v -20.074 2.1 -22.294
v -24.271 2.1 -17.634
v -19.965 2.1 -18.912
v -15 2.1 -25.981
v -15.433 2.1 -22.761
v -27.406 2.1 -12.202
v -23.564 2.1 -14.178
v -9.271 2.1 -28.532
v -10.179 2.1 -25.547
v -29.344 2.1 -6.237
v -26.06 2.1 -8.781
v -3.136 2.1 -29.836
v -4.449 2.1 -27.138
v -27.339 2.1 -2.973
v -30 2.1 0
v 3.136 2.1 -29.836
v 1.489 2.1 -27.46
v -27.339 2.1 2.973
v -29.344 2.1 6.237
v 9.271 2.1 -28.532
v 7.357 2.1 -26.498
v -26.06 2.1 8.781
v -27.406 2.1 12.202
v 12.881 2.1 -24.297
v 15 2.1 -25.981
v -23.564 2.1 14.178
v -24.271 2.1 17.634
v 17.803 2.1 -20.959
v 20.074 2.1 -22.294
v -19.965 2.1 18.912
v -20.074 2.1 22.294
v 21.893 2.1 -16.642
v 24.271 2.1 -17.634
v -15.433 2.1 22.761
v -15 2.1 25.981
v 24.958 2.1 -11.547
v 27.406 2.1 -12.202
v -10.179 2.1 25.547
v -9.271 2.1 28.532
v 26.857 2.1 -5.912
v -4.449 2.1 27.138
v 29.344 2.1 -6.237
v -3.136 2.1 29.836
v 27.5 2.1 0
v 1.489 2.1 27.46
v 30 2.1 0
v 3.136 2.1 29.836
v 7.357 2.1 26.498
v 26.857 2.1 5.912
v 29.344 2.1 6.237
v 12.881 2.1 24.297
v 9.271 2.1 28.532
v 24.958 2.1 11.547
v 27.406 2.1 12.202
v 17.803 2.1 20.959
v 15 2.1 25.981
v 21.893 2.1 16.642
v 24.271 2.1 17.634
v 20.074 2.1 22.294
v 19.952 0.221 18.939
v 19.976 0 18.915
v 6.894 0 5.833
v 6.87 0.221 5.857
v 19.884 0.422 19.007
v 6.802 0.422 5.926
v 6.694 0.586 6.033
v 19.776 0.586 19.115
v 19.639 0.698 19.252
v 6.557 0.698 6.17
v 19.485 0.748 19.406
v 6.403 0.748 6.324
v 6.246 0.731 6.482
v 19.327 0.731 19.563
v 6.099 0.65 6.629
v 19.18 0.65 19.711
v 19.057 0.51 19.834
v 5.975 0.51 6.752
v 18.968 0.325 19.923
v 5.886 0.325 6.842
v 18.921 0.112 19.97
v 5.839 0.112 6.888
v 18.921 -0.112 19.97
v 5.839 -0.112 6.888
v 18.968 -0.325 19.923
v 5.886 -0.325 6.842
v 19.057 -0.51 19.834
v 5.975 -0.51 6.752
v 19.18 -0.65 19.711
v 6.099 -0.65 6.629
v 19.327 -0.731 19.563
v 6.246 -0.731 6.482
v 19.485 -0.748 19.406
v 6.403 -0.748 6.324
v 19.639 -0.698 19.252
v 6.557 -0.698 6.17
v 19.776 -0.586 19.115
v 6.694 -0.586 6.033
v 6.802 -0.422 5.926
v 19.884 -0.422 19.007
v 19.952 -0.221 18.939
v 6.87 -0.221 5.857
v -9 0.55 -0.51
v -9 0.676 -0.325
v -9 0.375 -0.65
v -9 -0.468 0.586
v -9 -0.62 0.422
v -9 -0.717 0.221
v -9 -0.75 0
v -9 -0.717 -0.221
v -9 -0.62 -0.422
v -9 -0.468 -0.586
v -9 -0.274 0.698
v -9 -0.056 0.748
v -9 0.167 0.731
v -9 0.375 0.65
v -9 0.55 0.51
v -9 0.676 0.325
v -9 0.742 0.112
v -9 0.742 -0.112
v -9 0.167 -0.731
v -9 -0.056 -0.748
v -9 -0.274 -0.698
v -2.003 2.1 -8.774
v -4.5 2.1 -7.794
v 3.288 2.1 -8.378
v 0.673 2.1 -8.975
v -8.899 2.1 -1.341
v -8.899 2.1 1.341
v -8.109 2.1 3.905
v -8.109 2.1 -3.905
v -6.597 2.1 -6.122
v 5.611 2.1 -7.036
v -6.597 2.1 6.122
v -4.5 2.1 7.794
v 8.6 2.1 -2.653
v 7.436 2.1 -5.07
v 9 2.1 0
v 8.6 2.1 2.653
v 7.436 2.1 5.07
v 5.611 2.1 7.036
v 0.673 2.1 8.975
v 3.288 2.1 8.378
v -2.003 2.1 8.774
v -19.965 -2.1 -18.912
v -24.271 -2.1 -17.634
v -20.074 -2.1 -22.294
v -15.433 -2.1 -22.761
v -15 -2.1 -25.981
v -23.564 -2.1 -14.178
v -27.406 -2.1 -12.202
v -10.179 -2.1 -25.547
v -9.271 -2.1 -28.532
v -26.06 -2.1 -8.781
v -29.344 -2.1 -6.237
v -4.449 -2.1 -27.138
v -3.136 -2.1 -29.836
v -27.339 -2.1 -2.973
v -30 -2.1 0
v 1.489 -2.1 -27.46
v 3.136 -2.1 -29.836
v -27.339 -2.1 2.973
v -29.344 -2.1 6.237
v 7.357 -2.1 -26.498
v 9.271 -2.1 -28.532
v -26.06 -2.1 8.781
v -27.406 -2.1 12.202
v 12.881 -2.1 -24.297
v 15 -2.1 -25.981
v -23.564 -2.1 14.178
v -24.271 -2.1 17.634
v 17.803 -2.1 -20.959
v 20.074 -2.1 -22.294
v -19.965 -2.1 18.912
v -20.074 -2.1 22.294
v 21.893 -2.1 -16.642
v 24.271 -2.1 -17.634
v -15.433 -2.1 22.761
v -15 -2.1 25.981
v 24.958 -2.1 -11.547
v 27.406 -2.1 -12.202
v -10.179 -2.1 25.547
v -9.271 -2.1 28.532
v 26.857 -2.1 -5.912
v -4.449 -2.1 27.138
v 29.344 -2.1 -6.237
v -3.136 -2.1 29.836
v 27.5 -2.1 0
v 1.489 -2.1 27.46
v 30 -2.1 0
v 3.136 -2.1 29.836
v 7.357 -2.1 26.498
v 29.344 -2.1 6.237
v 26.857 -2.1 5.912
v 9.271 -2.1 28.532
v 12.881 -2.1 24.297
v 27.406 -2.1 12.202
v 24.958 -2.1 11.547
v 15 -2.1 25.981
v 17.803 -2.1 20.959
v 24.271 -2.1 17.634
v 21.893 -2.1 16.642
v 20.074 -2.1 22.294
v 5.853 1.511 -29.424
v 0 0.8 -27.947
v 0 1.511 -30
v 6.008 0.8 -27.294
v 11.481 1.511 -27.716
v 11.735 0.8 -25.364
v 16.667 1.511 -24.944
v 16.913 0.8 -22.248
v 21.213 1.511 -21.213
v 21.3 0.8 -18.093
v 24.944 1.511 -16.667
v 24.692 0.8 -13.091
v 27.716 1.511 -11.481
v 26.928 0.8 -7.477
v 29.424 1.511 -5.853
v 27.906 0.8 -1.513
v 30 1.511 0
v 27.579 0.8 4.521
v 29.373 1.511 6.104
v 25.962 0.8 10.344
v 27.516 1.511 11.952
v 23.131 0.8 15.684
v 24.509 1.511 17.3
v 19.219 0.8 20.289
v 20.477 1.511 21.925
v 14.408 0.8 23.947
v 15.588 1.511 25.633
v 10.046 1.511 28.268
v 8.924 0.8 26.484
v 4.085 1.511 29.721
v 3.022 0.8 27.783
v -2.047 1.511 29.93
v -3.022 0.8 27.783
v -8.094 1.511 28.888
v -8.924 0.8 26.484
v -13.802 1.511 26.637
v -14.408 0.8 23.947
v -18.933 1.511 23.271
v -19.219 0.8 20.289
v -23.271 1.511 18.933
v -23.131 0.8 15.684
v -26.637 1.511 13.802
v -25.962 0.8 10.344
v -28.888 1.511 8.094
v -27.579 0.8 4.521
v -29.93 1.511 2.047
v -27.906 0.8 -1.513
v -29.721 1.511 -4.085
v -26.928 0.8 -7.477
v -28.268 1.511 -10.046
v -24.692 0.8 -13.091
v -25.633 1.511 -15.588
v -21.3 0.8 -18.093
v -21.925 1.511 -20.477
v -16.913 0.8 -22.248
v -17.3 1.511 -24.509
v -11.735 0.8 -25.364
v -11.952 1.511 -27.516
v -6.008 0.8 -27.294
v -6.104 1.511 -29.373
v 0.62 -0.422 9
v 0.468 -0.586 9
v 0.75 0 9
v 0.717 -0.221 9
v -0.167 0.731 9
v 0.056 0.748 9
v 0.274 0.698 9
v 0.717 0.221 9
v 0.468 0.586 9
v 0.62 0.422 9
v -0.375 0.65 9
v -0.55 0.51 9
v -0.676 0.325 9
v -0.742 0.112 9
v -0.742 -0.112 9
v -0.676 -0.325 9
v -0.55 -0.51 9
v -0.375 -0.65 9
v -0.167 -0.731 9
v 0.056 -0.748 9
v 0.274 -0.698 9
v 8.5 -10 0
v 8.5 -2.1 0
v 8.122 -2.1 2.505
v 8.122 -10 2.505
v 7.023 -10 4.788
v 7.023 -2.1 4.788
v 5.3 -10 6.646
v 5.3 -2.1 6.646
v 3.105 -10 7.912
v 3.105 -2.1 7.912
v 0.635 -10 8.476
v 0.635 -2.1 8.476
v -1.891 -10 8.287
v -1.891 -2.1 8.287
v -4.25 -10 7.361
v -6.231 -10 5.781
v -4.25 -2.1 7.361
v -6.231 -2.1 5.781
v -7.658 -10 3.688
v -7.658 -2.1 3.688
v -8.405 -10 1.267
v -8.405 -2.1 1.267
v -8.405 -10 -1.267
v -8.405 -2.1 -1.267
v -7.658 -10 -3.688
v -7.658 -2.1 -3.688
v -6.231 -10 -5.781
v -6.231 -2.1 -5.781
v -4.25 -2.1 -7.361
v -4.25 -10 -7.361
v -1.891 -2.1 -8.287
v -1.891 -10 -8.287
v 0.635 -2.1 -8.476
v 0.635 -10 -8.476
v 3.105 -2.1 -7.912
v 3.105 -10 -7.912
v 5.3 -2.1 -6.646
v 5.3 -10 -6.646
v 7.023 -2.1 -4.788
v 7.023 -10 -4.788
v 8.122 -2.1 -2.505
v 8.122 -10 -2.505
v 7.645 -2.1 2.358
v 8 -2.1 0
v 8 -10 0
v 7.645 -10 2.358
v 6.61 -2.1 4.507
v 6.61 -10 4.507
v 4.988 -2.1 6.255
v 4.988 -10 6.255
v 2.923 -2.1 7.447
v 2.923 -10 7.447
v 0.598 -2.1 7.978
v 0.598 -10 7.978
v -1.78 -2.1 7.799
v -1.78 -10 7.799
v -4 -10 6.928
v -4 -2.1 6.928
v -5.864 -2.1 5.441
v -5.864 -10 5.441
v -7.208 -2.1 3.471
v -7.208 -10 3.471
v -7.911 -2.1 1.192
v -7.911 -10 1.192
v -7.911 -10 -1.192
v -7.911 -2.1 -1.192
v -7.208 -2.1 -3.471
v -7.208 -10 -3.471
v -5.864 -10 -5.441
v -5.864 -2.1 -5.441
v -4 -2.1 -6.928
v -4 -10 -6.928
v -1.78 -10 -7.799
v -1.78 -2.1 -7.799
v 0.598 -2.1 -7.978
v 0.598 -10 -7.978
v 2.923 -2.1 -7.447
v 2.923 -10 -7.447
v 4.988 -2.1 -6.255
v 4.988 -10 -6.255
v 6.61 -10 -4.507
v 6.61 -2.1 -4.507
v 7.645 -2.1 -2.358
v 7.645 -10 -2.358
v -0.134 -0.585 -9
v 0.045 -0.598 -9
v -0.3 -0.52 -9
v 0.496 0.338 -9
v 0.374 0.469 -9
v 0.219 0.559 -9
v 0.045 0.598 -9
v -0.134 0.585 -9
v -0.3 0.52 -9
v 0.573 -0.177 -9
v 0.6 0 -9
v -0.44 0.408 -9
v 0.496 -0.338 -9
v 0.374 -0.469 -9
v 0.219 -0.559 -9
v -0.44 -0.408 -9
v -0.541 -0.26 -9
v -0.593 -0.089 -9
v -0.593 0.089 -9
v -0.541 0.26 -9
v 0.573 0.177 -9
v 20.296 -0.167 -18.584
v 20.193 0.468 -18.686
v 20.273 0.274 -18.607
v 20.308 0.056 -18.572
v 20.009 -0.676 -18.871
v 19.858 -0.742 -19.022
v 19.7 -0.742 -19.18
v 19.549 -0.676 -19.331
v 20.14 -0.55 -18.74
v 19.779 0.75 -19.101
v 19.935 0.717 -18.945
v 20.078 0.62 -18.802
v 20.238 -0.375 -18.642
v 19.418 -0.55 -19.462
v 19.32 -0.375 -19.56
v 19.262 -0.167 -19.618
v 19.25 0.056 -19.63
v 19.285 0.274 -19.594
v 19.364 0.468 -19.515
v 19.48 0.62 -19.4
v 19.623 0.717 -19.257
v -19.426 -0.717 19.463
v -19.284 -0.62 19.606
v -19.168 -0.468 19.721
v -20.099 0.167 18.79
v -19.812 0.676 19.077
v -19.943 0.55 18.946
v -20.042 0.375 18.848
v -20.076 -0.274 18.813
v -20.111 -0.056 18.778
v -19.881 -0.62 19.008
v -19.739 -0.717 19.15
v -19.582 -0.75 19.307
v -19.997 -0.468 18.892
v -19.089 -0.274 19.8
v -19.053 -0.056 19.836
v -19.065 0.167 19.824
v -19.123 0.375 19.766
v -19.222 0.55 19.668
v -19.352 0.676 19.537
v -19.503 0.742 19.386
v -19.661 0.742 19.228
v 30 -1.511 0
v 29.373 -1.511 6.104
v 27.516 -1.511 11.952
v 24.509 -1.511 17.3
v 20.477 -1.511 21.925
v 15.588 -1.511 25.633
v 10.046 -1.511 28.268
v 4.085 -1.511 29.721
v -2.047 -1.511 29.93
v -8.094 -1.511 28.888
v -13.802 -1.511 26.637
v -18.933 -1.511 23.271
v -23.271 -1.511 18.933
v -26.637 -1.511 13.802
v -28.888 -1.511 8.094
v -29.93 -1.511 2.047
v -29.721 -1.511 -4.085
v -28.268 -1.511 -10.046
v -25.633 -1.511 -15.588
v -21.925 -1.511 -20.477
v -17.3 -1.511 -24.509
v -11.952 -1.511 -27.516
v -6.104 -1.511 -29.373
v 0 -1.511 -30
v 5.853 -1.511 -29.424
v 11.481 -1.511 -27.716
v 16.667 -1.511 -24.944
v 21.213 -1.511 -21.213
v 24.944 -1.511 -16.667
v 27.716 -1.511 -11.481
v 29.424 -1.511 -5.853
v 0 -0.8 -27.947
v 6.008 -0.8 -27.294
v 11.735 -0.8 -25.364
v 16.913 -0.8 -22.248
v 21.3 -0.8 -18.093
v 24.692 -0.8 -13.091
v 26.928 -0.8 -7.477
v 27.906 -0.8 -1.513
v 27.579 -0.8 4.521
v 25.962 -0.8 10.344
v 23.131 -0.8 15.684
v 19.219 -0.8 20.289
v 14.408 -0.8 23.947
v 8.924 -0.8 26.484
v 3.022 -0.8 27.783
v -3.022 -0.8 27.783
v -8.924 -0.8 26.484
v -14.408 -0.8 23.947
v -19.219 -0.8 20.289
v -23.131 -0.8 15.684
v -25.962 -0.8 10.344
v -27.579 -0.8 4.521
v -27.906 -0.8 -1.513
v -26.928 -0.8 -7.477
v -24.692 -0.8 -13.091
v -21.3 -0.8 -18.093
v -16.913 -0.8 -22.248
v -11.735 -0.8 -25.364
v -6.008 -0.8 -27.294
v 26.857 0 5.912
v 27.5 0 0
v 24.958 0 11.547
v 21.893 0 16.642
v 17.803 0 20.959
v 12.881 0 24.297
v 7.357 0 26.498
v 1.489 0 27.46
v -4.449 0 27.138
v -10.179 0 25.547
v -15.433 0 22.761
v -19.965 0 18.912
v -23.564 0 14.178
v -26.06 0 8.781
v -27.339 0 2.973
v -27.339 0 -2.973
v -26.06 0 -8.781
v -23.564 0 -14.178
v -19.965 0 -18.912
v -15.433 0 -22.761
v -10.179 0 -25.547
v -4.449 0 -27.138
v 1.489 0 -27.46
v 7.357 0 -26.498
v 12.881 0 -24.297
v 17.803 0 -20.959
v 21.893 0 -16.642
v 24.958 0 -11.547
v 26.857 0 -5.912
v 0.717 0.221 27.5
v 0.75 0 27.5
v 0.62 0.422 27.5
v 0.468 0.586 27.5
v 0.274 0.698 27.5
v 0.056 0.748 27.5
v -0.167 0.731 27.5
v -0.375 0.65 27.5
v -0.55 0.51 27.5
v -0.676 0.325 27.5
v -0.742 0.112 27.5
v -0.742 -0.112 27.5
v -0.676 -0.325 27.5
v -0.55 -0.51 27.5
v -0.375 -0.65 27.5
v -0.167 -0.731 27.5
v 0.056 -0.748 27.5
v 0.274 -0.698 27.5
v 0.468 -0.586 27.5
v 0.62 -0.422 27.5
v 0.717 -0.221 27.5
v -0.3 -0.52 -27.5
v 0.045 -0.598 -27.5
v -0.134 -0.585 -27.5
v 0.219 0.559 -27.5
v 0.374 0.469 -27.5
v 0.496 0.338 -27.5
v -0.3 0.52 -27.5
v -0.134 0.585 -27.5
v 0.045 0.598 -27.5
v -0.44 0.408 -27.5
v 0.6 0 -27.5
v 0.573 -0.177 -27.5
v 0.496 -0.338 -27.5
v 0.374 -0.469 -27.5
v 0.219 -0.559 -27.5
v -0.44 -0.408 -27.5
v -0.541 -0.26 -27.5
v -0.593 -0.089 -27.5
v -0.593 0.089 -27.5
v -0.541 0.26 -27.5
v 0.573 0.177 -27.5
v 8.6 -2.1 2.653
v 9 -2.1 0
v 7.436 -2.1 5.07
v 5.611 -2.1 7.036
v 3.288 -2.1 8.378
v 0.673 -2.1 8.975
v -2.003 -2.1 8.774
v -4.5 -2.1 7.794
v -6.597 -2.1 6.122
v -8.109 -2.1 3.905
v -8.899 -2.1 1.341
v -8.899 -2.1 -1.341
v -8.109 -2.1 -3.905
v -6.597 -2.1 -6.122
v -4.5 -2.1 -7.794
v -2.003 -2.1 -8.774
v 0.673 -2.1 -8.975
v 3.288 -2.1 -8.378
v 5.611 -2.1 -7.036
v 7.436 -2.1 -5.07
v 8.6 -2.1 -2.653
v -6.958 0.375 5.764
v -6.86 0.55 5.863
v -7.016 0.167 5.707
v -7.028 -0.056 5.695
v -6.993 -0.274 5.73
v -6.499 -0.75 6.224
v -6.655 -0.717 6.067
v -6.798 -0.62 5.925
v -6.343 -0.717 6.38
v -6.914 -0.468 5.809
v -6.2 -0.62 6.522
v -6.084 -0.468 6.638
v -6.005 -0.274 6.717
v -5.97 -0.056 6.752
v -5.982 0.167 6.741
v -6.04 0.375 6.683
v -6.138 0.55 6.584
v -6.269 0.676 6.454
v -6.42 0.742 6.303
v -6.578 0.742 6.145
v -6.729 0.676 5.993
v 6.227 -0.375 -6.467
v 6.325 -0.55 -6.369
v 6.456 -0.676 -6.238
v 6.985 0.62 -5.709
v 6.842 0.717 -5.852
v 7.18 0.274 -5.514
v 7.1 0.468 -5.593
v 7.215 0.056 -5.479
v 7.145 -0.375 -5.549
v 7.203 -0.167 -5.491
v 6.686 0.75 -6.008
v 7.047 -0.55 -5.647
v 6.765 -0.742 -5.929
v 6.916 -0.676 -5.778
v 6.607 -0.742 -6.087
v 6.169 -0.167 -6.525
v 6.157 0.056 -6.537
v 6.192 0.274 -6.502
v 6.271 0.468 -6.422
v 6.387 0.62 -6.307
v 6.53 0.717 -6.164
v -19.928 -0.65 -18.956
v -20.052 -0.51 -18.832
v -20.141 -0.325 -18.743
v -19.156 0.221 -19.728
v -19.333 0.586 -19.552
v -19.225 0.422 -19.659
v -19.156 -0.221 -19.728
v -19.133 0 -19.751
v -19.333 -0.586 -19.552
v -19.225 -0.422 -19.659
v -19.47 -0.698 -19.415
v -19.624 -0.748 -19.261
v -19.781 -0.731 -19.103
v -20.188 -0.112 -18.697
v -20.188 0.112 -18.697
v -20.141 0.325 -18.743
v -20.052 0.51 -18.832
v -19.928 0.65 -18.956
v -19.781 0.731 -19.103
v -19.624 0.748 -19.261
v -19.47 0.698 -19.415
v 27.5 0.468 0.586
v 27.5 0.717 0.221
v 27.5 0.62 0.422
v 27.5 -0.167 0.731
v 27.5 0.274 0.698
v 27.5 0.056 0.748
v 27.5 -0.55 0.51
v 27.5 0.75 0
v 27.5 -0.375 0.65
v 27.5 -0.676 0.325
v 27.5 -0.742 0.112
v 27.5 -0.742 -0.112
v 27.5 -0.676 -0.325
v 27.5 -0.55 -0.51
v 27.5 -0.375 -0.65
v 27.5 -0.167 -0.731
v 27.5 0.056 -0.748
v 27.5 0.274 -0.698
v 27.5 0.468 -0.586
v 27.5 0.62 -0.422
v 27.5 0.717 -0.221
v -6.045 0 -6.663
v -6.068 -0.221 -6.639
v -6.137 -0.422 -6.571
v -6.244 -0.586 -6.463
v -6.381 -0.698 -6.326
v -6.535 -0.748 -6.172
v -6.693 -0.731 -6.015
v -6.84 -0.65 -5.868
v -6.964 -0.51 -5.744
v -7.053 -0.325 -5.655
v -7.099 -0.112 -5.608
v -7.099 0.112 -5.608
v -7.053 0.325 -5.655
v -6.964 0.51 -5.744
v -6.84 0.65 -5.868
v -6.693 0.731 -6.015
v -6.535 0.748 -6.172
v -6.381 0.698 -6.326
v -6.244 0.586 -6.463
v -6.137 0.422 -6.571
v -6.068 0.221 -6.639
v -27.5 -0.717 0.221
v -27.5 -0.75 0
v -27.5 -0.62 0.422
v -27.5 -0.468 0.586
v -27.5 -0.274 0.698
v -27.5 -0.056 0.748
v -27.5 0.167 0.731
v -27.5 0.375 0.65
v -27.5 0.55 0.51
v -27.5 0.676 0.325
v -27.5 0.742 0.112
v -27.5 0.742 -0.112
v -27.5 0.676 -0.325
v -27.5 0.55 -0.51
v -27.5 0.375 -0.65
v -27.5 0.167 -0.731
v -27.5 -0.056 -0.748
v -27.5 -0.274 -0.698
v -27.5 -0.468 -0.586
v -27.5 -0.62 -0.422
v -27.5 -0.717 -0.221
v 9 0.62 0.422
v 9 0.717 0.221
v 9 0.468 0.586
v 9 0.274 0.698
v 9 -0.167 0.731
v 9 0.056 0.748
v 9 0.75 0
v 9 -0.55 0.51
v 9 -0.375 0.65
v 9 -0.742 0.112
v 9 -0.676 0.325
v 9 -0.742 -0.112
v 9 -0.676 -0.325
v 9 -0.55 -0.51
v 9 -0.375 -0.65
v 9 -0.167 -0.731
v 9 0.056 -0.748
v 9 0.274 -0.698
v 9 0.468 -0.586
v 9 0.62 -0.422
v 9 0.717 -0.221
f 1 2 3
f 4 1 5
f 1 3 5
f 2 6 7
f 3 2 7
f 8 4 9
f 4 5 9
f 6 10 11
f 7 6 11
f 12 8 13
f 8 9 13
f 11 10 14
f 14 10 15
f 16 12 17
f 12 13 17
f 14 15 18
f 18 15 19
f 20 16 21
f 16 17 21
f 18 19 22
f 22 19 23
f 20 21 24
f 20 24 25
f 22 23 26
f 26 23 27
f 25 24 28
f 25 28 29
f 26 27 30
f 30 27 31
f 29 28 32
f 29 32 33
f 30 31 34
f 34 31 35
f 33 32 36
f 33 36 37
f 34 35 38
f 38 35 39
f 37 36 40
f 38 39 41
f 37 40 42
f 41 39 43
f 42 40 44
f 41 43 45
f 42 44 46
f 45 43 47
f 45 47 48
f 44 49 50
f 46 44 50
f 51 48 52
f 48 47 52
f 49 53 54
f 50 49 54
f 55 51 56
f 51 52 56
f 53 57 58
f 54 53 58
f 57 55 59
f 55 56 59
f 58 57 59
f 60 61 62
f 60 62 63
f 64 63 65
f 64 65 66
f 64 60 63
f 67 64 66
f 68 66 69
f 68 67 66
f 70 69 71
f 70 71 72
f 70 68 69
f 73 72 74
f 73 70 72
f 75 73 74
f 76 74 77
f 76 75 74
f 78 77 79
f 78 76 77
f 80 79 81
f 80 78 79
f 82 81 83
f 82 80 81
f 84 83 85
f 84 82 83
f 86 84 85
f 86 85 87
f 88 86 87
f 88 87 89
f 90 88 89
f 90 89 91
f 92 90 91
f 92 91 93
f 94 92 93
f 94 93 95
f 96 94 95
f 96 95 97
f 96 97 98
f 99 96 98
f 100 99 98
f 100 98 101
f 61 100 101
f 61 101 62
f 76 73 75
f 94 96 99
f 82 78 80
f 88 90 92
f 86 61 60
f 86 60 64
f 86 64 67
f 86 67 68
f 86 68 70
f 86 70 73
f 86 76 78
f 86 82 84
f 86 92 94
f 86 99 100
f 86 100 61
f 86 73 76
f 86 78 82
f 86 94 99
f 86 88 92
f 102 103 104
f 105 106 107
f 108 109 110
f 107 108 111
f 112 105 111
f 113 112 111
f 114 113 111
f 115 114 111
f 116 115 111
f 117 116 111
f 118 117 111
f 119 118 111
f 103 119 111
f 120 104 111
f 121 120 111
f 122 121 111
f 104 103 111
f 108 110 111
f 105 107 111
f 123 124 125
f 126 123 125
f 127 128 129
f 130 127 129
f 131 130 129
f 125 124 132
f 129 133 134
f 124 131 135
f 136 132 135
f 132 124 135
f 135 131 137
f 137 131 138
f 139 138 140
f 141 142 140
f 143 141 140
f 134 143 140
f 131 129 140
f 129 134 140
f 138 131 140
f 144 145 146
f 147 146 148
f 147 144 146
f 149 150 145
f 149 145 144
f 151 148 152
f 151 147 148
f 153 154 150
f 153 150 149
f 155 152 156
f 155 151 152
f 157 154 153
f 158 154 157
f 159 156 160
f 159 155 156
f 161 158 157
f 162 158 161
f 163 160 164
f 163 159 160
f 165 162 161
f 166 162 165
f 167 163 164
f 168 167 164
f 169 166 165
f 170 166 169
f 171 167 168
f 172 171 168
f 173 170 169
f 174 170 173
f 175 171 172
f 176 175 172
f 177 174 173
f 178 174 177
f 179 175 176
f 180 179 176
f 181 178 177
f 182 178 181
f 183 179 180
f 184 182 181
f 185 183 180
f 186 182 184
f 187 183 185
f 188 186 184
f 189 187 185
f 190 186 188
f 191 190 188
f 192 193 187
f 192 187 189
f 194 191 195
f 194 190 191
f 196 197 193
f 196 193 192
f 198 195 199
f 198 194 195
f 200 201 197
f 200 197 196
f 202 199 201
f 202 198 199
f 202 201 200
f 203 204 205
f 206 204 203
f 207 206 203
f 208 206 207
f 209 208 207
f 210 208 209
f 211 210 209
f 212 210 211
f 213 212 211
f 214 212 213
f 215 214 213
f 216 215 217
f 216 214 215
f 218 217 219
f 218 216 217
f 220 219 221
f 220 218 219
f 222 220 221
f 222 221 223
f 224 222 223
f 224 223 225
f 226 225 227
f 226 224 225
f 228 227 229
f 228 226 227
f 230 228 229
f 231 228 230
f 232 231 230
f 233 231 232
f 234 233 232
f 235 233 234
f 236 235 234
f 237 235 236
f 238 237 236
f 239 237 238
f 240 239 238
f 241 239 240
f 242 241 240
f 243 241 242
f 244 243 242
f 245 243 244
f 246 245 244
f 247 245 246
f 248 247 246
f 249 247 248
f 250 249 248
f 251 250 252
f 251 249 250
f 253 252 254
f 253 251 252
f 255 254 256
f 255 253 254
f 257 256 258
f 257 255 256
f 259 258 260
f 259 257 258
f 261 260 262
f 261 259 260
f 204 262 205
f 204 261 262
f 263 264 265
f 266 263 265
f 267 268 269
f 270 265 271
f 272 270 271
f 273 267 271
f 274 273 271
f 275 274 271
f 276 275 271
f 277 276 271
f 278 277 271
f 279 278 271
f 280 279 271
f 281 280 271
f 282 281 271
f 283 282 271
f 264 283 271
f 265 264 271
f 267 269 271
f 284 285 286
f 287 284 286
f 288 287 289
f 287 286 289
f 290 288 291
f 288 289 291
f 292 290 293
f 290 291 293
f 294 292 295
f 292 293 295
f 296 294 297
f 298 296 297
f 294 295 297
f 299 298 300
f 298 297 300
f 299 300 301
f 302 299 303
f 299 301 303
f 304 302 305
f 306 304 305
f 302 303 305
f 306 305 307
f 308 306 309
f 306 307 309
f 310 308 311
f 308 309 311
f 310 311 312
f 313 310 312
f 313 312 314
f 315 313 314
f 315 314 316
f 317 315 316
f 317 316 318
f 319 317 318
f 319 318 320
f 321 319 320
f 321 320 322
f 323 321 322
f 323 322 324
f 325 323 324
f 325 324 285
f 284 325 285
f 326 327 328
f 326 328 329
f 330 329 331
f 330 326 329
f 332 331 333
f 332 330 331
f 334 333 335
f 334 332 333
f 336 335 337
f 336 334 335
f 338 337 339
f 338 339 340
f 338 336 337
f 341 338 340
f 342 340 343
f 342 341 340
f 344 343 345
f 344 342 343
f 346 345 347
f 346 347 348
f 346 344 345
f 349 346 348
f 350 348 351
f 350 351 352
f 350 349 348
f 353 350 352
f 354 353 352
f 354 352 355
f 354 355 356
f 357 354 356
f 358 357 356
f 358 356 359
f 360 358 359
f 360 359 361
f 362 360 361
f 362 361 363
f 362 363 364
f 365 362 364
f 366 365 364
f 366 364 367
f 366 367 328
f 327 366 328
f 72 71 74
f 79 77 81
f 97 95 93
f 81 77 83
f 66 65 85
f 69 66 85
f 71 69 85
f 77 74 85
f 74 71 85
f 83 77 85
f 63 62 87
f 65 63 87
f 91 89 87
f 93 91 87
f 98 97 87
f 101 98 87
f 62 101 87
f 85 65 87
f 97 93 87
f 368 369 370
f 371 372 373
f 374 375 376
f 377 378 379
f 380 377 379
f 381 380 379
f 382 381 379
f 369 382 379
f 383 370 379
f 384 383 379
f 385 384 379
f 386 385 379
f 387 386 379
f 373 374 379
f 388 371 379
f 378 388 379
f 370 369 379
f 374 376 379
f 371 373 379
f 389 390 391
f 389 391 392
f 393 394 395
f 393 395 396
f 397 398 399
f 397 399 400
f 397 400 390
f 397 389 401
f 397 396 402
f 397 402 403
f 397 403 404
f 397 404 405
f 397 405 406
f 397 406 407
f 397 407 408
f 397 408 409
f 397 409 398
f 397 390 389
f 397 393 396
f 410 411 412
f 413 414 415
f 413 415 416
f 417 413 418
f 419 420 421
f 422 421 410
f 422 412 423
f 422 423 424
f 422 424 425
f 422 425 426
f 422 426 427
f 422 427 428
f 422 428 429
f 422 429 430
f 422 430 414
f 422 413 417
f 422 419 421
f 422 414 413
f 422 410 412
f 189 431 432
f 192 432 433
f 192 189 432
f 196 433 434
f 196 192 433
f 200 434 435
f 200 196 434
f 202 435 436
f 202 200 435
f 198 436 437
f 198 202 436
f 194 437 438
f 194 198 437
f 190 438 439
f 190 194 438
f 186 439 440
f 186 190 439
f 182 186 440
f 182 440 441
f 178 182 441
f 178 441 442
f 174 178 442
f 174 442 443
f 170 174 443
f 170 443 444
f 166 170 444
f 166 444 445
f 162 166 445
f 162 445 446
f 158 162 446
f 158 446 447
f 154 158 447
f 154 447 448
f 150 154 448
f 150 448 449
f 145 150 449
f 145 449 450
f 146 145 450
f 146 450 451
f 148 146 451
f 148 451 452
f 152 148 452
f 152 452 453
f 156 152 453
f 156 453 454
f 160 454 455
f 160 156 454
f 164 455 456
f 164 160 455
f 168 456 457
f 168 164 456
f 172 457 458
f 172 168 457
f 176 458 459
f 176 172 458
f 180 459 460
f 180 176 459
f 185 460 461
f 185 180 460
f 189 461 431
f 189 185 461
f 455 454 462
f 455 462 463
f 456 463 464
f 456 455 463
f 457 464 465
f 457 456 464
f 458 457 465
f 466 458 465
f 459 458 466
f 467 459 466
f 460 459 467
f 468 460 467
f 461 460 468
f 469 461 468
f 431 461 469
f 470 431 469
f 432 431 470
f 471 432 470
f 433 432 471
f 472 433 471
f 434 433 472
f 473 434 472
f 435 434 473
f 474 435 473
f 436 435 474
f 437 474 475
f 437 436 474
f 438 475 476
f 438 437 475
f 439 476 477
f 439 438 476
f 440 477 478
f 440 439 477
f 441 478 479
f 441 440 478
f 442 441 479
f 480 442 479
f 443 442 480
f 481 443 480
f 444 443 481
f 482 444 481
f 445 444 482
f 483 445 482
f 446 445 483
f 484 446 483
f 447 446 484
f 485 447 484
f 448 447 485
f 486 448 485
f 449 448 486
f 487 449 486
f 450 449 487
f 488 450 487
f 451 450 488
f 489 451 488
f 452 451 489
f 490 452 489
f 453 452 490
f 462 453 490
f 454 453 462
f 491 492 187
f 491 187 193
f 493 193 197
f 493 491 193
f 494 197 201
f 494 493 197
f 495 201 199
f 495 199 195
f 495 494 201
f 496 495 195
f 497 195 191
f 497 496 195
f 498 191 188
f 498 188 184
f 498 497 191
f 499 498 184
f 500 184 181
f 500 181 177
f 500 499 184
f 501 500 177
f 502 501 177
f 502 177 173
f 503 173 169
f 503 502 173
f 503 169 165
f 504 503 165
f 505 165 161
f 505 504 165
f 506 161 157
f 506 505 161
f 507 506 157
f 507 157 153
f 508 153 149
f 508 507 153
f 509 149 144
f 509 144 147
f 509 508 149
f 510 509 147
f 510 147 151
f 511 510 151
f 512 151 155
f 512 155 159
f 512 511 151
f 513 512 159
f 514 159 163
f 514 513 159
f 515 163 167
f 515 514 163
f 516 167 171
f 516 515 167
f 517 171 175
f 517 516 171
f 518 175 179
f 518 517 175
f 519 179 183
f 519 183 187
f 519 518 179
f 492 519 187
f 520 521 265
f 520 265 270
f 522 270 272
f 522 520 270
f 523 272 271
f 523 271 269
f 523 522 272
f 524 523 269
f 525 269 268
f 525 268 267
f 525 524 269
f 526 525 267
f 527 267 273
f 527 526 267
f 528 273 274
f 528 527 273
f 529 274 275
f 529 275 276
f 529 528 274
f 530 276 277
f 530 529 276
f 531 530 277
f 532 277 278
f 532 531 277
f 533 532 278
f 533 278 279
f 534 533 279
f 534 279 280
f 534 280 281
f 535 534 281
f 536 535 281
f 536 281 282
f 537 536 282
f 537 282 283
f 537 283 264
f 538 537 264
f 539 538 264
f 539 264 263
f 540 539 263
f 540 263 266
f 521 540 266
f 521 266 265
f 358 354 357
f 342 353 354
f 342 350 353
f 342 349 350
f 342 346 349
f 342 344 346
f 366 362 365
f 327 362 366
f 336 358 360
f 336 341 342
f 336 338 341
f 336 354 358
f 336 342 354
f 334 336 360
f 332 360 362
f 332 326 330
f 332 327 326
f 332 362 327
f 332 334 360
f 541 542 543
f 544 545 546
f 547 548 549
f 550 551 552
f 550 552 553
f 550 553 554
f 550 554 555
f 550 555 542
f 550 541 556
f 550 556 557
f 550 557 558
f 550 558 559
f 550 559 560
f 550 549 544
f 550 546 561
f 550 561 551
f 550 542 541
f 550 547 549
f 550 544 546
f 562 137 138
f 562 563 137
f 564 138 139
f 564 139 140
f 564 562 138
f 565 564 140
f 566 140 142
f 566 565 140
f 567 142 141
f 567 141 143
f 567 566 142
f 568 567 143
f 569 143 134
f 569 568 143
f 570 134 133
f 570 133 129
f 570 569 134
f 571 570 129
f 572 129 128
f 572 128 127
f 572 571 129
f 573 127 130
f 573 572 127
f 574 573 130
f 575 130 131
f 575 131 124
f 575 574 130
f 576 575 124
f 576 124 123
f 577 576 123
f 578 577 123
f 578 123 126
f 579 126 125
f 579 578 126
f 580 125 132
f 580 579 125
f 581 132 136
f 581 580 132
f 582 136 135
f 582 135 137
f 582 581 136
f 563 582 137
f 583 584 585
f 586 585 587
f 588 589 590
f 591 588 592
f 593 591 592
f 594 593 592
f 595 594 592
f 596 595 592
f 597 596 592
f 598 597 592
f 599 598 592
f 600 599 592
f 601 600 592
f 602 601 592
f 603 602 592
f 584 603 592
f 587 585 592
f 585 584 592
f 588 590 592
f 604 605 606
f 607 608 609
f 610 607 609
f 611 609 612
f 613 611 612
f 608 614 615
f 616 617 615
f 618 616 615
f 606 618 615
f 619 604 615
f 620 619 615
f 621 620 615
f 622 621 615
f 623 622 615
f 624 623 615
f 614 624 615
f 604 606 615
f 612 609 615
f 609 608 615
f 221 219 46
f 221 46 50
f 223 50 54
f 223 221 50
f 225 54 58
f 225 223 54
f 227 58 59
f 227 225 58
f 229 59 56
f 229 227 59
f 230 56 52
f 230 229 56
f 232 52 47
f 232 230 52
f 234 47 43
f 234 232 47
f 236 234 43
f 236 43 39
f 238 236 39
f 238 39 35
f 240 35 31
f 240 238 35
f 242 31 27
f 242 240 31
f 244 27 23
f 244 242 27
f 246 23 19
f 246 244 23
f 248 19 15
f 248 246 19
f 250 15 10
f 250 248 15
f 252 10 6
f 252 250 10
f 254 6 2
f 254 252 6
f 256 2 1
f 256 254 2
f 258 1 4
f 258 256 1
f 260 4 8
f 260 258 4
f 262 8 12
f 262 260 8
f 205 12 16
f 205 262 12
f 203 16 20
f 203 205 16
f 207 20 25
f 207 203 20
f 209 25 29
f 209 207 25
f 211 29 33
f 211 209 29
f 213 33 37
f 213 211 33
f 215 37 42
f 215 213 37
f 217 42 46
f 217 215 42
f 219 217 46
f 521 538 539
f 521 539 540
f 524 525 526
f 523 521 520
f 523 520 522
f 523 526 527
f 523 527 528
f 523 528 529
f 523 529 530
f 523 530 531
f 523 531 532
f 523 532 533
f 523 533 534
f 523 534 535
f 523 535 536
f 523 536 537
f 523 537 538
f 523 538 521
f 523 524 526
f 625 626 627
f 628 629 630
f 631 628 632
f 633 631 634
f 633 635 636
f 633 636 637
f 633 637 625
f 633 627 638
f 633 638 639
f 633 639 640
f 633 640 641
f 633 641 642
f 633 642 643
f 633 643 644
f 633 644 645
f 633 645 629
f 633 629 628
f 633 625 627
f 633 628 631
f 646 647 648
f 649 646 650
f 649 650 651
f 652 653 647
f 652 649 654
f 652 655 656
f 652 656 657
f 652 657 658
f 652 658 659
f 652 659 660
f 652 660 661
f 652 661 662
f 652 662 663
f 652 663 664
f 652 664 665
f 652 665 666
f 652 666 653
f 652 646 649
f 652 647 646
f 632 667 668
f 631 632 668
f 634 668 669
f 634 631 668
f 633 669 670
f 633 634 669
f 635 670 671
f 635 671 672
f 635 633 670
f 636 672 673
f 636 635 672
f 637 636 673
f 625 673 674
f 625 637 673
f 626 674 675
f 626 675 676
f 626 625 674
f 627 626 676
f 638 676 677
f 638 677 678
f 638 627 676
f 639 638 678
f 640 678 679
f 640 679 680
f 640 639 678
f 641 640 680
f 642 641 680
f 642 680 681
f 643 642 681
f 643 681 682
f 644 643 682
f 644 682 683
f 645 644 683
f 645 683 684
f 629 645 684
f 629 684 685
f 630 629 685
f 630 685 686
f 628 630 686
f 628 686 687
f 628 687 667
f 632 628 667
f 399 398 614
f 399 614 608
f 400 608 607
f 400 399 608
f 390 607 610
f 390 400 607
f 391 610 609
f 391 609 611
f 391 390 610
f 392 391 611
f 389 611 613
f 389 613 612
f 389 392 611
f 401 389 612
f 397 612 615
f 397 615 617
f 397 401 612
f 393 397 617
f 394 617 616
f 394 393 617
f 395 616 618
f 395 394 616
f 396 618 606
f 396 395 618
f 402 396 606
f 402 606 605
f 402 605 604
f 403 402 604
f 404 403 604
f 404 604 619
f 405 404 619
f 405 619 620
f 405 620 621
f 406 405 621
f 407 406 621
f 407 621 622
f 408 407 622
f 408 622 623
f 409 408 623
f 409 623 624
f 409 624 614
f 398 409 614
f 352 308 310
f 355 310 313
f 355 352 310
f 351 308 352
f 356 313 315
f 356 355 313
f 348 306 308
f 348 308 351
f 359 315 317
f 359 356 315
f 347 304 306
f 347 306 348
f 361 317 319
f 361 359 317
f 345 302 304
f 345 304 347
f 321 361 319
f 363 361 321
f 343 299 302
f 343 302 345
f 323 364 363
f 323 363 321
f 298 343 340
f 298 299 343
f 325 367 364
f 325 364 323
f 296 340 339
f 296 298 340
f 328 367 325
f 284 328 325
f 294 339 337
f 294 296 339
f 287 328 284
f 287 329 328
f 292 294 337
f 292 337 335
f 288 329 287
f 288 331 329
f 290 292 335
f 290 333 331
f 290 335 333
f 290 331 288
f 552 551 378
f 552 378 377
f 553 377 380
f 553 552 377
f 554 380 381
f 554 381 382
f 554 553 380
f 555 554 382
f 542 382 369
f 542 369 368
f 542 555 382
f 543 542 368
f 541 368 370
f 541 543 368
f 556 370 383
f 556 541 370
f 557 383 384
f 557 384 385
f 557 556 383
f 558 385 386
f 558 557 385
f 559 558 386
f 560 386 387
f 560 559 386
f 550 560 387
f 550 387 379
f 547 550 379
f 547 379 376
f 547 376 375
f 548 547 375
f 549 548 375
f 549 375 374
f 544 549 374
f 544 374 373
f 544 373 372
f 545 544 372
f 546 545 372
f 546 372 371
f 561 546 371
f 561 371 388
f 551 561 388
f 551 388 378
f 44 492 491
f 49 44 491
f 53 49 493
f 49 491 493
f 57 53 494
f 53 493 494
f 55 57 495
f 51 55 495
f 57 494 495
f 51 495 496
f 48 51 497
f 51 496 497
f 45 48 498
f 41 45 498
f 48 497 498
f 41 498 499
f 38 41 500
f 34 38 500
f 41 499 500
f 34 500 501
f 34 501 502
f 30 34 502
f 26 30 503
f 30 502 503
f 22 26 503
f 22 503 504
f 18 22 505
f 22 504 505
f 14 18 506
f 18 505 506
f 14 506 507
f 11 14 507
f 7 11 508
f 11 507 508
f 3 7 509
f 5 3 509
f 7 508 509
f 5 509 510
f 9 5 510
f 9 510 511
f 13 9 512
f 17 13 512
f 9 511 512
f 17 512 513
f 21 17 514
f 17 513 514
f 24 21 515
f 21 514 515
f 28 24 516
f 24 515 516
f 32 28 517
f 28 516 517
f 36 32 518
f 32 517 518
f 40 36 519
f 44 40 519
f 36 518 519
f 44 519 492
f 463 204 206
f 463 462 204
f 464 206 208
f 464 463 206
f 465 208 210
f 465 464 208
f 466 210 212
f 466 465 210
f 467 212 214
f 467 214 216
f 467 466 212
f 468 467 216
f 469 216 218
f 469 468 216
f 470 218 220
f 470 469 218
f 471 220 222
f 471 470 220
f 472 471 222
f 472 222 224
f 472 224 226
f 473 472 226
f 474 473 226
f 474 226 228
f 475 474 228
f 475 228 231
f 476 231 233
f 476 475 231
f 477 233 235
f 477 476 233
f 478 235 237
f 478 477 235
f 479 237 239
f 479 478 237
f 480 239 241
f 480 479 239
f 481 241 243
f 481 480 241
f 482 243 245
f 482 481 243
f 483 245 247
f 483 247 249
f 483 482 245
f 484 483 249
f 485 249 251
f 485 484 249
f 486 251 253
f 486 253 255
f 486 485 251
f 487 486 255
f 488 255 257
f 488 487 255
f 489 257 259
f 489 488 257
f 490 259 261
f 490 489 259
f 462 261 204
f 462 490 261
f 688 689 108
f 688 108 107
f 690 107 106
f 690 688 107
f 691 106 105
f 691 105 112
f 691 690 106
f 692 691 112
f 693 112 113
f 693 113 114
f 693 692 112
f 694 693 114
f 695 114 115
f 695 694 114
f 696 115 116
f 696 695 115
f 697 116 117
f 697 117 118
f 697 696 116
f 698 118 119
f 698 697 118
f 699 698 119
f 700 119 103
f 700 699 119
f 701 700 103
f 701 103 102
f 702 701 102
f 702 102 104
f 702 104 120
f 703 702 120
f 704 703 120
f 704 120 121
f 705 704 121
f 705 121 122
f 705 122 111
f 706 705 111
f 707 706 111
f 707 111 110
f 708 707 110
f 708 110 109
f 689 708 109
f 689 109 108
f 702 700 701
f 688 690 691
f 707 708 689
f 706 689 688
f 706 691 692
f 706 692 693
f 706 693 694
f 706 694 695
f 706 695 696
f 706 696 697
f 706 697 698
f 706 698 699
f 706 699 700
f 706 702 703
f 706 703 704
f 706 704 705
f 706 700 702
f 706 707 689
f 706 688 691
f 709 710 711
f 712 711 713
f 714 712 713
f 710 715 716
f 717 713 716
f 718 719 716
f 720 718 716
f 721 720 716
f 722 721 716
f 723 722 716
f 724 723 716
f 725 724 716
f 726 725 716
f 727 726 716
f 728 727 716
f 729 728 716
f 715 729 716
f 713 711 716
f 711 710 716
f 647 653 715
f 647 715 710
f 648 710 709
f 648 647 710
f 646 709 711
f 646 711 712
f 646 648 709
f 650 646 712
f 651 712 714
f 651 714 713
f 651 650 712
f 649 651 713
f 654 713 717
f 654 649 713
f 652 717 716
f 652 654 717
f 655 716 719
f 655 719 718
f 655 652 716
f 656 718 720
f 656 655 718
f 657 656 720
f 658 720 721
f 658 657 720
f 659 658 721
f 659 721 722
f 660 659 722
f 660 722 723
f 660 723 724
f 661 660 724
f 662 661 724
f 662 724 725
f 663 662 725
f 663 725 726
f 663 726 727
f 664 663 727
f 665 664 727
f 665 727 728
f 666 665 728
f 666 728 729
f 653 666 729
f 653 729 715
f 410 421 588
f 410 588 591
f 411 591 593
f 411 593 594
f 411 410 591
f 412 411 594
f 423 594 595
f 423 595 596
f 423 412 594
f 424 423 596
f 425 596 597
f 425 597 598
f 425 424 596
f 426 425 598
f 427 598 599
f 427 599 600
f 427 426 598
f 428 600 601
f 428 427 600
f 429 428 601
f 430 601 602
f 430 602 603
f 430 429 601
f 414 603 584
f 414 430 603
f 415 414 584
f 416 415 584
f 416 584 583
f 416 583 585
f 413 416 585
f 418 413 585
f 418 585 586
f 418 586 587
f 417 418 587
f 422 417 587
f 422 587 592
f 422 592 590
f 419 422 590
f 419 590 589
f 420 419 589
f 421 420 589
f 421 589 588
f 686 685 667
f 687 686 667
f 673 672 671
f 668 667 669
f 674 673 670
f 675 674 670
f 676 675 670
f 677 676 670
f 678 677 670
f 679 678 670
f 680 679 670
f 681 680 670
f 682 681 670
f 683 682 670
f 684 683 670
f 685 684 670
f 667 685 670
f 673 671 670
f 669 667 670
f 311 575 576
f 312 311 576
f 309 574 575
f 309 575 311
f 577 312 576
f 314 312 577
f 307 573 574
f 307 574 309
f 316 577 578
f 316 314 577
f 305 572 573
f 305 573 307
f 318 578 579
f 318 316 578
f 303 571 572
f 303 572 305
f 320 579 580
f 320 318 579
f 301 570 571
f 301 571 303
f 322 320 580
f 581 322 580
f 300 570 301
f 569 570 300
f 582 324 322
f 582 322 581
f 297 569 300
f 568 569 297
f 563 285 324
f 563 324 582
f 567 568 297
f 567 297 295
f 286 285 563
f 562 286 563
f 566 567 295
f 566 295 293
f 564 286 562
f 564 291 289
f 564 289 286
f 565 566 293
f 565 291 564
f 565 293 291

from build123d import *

# Parameters (mm, degrees)
F0_R     = 30
F0_R_2   = 27.5
F1_DEPTH = 2.1
F3_R     = 8.5
F3_R_2   = 8
F4_DEPTH = 10
F5_R     = 9
F6_DEPTH = 2.1
F7_R     = 9
F8_DEPTH = 2.1
F13_R    = 0.75
F28_R    = 0.75
F27_R    = 0.6
F26_R    = 0.75
F25_R    = 0.75
F24_R    = 0.75
F23_R    = 0.75
F22_R    = 0.75


with BuildPart() as f1:
    # F0 (on Front) → F1 (new body)
    with BuildSketch(Plane.XZ):
        Circle(F0_R)
        Circle(F0_R_2, mode=Mode.SUBTRACT)
    extrude(amount=F1_DEPTH)

    # F2: F1 across plane


with BuildPart() as f1_1:
    add(f1.part)
    add(f1.part.mirror(Plane.XZ))

    # F9 (on Right) → F10 (revolve, cut)
    with BuildSketch(Plane.YZ):
        Polygon((-1.6999973194, -30.5470529164), (0, -30.5470529164), (0, -27.9470529164), (-0.8, -27.9470529164), align=None)
        Polygon((0, -30.5470529164), (1.7000026806, -30.5470529164), (0.8, -27.9470529164), (0, -27.9470529164), align=None)
    revolve(axis=Axis((0, -1.5917905839, 0), (0, -1, 0)), mode=Mode.SUBTRACT)


with BuildPart() as f4:
    # F3 (on Front) → F4 (new body)
    with BuildSketch(Plane.XZ):
        Circle(F3_R)
        Circle(F3_R_2, mode=Mode.SUBTRACT)
    extrude(amount=F4_DEPTH)

    # F5 (on Front) → F6 (join)
    with BuildSketch(Plane.XZ):
        Circle(F5_R)
    extrude(amount=F6_DEPTH)

    # F7 (on Front) → F8 (join)
    with BuildSketch(Plane.XZ):
        Circle(F7_R)
    extrude(amount=-F8_DEPTH)


with BuildPart() as f14:
    # F14: sweep along a path in F11
    with BuildLine(Plane.XZ) as f14_path:
        Line((9, 0), (27.5, 0))
    # F13 (on line) → F14 (sweep)
    with BuildSketch(Plane.YZ.offset(9)):
        Circle(F13_R)
    sweep(path=f14_path.line)


with BuildPart() as f29:
    # F29: sweep along a path in F11
    with BuildLine(Plane.XZ) as f29_path:
        Line((6.8131908172, -5.8805128083), (19.9061828293, -18.9735048203))
    # F28 (on line) → F29 (sweep)
    with BuildSketch(Plane(origin=(6.3468518127, 0, -6.3468518127), x_dir=(0, 1, 0), z_dir=(0.7071067812, 0, -0.7071067812))):
        with Locations((0, 0.4794385867)):
            Circle(F28_R)
    sweep(path=f29_path.line)


with BuildPart() as f30:
    # F30: sweep along a path in F11
    with BuildLine(Plane.XZ) as f30_path:
        Line((0, -9), (0, -27.5))
    # F27 (on line) → F30 (sweep)
    with BuildSketch(Plane(origin=(0, 0, -9), x_dir=(1, 0, 0), z_dir=(0, 0, -1))):
        Circle(F27_R)
    sweep(path=f30_path.line)


with BuildPart() as f31:
    # F31: sweep along a path in F11
    with BuildLine(Plane.XZ) as f31_path:
        Line((-6.7128684512, -5.9947808264), (-19.8011652898, -19.0830776649))
    # F26 (on line) → F31 (sweep)
    with BuildSketch(Plane(origin=(-6.3538246388, 0, -6.3538246388), x_dir=(0.7071067812, 0, -0.7071067812), z_dir=(-0.7071067812, 0, -0.7071067812))):
        with Locations((-0.3127330392, 0)):
            Circle(F26_R)
    sweep(path=f31_path.line)


with BuildPart() as f32:
    # F32: sweep along a path in F11
    with BuildLine(Plane.XZ) as f32_path:
        Line((-9, 0), (-27.5, 0))
    # F25 (on line) → F32 (sweep)
    with BuildSketch(Plane(origin=(-9, 0, 0), x_dir=(0, -1, 0), z_dir=(-1, 0, 0))):
        Circle(F25_R)
    sweep(path=f32_path.line)


with BuildPart() as f33:
    # F33: sweep along a path in F11
    with BuildLine(Plane.XZ) as f33_path:
        Line((-6.5450241351, 6.1775933074), (-19.6282840295, 19.2608532017))
    # F24 (on line) → F33 (sweep)
    with BuildSketch(Plane(origin=(-6.3613087212, 0, 6.3613087212), x_dir=(0, -1, 0), z_dir=(-0.7071067812, 0, 0.7071067812))):
        with Locations((0, -0.1948109458)):
            Circle(F24_R)
    sweep(path=f33_path.line)


with BuildPart() as f34:
    # F34: sweep along a path in F11
    with BuildLine(Plane.XZ) as f34_path:
        Line((0, 9), (0, 27.5))
    # F23 (on line) → F34 (sweep)
    with BuildSketch(Plane.XY.offset(9)):
        Circle(F23_R)
    sweep(path=f34_path.line)


with BuildPart() as f35:
    # F35: sweep along a path in F11
    with BuildLine(Plane.XZ) as f35_path:
        Line((6.3048795356, 6.4224990496), (19.3865377949, 19.5041573088))
    # F22 (on line) → F35 (sweep)
    with BuildSketch(Plane(origin=(6.3636892926, 0, 6.3636892926), x_dir=(0.7071067812, 0, -0.7071067812), z_dir=(0.7071067812, 0, 0.7071067812))):
        Circle(F22_R)
    sweep(path=f35_path.line)


solid = Compound([f1_1.part, f4.part, f14.part, f29.part, f30.part, f31.part, f32.part, f33.part, f34.part, f35.part])
